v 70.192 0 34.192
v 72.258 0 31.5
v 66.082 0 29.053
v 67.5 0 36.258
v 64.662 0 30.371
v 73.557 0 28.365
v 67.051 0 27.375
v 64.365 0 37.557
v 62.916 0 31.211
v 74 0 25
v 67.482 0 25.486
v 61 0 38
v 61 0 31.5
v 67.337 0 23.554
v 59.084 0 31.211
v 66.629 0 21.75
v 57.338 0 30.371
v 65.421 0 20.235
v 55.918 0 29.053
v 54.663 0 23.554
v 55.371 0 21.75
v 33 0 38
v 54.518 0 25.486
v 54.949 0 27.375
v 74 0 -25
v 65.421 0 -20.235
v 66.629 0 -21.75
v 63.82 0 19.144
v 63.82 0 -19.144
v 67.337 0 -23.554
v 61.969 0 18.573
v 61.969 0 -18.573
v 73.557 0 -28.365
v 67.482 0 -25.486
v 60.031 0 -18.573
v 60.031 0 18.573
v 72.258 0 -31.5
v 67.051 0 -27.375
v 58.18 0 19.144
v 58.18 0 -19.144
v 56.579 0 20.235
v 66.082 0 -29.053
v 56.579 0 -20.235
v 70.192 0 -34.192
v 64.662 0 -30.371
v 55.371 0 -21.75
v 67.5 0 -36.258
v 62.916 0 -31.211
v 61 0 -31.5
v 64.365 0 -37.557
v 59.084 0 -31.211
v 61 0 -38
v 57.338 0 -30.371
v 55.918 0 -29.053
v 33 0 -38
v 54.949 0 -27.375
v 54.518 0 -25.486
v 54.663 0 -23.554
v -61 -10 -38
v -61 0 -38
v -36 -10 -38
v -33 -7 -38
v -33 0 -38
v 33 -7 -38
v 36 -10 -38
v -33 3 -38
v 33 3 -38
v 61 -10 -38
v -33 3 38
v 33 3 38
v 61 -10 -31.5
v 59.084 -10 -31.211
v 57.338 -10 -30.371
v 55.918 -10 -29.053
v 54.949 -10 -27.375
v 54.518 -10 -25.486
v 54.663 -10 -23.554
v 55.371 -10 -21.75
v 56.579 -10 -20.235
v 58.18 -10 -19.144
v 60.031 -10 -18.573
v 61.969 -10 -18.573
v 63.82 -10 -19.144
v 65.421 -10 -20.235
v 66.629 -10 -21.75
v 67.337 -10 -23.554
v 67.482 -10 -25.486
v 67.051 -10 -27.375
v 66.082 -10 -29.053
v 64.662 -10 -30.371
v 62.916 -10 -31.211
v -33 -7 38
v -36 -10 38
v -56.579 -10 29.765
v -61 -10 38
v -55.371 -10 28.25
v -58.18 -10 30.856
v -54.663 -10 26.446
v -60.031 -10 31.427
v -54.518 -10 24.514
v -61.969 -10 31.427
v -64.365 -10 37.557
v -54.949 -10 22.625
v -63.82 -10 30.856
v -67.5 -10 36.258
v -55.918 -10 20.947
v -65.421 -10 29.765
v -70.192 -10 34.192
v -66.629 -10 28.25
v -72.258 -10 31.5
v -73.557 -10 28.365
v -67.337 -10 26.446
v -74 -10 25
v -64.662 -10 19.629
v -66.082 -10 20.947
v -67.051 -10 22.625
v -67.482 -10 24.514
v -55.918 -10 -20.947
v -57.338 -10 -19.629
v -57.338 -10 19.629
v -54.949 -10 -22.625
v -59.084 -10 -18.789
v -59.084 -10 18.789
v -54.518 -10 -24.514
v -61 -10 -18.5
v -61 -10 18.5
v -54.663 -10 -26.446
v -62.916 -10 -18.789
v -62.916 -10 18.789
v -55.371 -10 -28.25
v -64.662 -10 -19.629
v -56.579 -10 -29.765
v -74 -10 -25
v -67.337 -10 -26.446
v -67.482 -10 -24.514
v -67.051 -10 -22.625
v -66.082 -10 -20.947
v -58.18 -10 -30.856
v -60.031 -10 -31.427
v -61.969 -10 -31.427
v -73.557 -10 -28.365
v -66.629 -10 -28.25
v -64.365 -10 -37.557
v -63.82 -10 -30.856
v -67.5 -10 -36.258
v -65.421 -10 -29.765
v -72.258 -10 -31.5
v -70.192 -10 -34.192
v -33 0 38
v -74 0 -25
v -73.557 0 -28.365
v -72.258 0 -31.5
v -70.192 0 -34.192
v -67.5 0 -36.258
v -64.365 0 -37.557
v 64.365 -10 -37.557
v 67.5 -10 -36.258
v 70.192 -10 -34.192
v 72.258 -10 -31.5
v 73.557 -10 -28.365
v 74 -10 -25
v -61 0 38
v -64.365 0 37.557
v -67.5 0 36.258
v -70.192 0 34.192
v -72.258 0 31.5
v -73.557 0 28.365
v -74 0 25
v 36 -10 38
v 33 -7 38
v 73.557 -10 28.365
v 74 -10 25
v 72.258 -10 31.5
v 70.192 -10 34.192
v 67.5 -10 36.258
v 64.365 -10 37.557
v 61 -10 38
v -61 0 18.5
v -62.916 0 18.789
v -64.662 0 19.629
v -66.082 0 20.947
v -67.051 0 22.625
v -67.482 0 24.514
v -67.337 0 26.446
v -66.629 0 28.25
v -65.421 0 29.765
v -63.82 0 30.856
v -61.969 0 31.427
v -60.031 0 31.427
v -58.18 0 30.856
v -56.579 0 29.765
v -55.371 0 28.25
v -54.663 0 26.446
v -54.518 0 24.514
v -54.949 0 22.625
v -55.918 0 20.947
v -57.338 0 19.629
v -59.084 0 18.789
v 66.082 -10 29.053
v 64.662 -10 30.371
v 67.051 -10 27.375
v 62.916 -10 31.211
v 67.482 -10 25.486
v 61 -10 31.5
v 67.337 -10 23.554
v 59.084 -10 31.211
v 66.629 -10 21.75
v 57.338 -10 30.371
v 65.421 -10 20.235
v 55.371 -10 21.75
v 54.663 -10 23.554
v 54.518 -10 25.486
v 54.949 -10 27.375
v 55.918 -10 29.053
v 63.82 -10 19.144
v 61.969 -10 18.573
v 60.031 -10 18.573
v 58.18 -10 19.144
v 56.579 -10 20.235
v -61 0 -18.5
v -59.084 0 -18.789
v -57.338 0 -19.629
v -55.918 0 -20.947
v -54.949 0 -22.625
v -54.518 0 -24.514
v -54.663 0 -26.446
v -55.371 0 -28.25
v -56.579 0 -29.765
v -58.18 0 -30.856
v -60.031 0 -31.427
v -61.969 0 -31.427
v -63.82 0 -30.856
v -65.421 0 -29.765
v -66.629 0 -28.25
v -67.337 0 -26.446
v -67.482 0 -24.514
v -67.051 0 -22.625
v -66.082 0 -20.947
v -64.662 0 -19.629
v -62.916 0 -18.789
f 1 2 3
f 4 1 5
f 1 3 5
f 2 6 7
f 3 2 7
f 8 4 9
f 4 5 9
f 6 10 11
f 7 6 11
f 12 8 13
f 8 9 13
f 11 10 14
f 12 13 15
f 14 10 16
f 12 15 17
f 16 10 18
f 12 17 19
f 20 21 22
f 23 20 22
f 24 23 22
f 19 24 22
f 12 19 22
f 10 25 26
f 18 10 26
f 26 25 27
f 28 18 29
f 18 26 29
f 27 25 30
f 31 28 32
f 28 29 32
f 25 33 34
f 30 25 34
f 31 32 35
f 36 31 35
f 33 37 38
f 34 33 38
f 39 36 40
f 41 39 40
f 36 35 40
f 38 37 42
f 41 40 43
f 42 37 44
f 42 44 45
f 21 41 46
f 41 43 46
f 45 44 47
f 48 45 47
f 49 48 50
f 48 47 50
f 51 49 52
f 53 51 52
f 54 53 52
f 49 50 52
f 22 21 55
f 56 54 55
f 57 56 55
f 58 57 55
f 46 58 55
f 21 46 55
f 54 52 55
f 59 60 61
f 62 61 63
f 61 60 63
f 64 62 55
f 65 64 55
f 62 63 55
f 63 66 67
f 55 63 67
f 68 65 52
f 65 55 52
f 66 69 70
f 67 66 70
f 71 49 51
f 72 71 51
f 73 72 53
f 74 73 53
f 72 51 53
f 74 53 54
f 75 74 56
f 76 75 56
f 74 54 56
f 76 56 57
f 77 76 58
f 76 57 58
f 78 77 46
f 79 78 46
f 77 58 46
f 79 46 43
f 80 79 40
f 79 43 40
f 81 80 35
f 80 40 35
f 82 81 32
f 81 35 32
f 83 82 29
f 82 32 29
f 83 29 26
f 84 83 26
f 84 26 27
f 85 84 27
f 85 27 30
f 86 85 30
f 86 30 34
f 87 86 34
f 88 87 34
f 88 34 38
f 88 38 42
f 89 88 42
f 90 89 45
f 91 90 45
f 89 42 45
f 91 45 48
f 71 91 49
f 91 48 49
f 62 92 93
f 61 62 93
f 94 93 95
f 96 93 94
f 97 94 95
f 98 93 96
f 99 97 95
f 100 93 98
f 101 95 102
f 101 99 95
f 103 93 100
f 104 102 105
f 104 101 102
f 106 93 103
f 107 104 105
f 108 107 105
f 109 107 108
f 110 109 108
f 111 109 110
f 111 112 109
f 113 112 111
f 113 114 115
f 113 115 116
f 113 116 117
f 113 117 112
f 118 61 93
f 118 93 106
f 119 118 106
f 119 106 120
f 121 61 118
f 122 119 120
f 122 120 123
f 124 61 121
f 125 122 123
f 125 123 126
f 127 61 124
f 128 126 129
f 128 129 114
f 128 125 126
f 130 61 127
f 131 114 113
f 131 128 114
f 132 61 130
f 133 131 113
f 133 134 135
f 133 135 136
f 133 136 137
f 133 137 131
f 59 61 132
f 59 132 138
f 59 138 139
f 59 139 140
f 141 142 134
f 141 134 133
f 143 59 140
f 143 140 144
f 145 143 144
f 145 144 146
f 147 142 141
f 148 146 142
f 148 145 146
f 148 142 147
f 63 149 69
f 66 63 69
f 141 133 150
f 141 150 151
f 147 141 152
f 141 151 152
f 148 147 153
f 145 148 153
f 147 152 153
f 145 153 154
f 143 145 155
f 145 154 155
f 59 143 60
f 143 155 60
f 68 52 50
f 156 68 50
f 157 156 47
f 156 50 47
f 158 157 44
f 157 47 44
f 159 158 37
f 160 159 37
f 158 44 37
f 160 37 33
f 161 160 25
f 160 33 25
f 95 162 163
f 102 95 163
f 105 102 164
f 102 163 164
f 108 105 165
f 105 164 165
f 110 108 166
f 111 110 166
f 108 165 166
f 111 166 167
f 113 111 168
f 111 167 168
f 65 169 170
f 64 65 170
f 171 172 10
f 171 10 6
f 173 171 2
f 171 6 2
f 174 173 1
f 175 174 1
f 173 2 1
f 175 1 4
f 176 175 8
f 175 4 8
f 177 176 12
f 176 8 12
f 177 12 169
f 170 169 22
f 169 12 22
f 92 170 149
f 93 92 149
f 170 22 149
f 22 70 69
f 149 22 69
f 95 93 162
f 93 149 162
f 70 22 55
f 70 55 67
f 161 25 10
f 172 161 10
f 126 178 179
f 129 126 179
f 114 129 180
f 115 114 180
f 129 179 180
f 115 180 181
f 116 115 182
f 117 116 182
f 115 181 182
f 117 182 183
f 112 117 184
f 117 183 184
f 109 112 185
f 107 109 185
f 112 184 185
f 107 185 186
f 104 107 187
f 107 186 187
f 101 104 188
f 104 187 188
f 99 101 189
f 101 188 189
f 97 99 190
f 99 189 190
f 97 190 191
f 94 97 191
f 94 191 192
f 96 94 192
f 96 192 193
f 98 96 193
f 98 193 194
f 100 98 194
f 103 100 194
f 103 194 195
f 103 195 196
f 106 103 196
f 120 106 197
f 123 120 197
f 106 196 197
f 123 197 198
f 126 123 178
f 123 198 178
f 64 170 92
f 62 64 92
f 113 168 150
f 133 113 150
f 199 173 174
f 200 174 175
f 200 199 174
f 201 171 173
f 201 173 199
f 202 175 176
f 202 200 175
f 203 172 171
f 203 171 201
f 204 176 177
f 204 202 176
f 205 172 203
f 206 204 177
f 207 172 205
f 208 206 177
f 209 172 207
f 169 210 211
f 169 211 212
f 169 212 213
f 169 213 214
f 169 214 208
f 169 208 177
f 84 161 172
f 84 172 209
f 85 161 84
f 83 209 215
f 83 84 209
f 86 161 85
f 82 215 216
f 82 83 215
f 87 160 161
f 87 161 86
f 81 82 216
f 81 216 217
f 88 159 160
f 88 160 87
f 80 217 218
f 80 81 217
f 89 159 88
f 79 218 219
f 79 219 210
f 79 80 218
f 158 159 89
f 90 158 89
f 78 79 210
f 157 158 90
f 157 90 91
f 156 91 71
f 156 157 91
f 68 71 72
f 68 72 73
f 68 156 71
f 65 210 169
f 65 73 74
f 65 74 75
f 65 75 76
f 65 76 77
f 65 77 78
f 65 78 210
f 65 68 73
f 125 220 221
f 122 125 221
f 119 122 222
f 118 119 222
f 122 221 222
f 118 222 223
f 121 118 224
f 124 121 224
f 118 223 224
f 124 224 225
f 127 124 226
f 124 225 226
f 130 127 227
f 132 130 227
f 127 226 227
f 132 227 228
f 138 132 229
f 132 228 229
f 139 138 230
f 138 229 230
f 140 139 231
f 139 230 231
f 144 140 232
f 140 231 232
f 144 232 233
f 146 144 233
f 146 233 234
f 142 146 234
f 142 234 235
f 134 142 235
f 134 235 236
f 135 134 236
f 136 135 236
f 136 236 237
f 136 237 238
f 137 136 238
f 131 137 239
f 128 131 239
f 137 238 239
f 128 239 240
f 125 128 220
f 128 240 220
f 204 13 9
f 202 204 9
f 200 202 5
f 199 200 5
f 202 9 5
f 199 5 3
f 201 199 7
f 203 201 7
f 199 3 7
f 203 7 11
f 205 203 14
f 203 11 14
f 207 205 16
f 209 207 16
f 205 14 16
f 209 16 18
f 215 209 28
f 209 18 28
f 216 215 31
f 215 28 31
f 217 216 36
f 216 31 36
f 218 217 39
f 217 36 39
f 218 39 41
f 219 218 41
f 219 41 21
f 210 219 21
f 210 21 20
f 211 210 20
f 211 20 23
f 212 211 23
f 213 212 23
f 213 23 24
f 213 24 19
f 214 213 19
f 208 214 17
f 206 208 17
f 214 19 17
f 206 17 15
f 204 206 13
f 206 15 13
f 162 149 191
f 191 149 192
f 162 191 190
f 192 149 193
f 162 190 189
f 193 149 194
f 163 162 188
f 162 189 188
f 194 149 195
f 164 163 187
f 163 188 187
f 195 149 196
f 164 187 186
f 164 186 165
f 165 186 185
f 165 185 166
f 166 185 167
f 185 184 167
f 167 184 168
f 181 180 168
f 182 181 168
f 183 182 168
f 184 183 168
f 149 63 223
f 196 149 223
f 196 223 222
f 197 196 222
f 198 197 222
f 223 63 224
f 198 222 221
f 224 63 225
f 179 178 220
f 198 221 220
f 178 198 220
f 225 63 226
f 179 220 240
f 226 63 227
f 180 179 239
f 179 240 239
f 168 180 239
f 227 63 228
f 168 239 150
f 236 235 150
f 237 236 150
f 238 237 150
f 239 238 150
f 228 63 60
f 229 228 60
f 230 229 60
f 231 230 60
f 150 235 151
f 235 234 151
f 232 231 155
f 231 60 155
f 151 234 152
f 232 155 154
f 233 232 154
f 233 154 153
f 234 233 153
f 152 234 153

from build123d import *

# Parameters (mm, degrees)
SKETCH1_R           = 6.5
BOSS_EXTRUDE1_DEPTH = 10
CUT_EXTRUDE1_DEPTH  = 107.545764815
SKETCH3_W           = 66
SKETCH3_H           = 3
BOSS_EXTRUDE2_DEPTH = 76


with BuildPart() as part:
    # Sketch1 → Boss-Extrude1 (new body)
    with BuildSketch(Plane(origin=(0, 0, 0), x_dir=(1, 0, 0), z_dir=(0, 1, 0))):
        with BuildLine():
            Line((-61, 38), (61, 38))
            ThreePointArc((61, 38), (70.192388155, 34.192388155), (74, 25))
            Line((74, 25), (74, -25))
            ThreePointArc((74, -25), (70.192388155, -34.192388155), (61, -38))
            Line((61, -38), (-61, -38))
            ThreePointArc((-61, -38), (-70.192388155, -34.192388155), (-74, -25))
            Line((-74, -25), (-74, 25))
            ThreePointArc((-74, 25), (-70.192388155, 34.192388155), (-61, 38))
        make_face()
        with Locations(Location((-61, 25, 0), (0, 0, 270))):
            Circle(SKETCH1_R, mode=Mode.SUBTRACT)
        with Locations(Location((61, 25, 0), (0, 0, 90))):
            Circle(SKETCH1_R, mode=Mode.SUBTRACT)
        with Locations(Location((61, -25, 0), (0, 0, 270))):
            Circle(SKETCH1_R, mode=Mode.SUBTRACT)
        with Locations(Location((-61, -25, 0), (0, 0, 90))):
            Circle(SKETCH1_R, mode=Mode.SUBTRACT)
    extrude(amount=-BOSS_EXTRUDE1_DEPTH)

    # Sketch2 → Cut-Extrude1 (cut, through all)
    with BuildSketch(Plane.XY.offset(38)):
        Polygon((-36, -10), (36, -10), (33, -7), (-33, -7), align=None)
    extrude(amount=-CUT_EXTRUDE1_DEPTH, mode=Mode.SUBTRACT)

    # Sketch3 → Boss-Extrude2 (add, through all)
    with BuildSketch(Plane.XY.offset(38)):
        with Locations((0, 1.5)):
            Rectangle(SKETCH3_W, SKETCH3_H)
    extrude(amount=-BOSS_EXTRUDE2_DEPTH)


solid = part.part
